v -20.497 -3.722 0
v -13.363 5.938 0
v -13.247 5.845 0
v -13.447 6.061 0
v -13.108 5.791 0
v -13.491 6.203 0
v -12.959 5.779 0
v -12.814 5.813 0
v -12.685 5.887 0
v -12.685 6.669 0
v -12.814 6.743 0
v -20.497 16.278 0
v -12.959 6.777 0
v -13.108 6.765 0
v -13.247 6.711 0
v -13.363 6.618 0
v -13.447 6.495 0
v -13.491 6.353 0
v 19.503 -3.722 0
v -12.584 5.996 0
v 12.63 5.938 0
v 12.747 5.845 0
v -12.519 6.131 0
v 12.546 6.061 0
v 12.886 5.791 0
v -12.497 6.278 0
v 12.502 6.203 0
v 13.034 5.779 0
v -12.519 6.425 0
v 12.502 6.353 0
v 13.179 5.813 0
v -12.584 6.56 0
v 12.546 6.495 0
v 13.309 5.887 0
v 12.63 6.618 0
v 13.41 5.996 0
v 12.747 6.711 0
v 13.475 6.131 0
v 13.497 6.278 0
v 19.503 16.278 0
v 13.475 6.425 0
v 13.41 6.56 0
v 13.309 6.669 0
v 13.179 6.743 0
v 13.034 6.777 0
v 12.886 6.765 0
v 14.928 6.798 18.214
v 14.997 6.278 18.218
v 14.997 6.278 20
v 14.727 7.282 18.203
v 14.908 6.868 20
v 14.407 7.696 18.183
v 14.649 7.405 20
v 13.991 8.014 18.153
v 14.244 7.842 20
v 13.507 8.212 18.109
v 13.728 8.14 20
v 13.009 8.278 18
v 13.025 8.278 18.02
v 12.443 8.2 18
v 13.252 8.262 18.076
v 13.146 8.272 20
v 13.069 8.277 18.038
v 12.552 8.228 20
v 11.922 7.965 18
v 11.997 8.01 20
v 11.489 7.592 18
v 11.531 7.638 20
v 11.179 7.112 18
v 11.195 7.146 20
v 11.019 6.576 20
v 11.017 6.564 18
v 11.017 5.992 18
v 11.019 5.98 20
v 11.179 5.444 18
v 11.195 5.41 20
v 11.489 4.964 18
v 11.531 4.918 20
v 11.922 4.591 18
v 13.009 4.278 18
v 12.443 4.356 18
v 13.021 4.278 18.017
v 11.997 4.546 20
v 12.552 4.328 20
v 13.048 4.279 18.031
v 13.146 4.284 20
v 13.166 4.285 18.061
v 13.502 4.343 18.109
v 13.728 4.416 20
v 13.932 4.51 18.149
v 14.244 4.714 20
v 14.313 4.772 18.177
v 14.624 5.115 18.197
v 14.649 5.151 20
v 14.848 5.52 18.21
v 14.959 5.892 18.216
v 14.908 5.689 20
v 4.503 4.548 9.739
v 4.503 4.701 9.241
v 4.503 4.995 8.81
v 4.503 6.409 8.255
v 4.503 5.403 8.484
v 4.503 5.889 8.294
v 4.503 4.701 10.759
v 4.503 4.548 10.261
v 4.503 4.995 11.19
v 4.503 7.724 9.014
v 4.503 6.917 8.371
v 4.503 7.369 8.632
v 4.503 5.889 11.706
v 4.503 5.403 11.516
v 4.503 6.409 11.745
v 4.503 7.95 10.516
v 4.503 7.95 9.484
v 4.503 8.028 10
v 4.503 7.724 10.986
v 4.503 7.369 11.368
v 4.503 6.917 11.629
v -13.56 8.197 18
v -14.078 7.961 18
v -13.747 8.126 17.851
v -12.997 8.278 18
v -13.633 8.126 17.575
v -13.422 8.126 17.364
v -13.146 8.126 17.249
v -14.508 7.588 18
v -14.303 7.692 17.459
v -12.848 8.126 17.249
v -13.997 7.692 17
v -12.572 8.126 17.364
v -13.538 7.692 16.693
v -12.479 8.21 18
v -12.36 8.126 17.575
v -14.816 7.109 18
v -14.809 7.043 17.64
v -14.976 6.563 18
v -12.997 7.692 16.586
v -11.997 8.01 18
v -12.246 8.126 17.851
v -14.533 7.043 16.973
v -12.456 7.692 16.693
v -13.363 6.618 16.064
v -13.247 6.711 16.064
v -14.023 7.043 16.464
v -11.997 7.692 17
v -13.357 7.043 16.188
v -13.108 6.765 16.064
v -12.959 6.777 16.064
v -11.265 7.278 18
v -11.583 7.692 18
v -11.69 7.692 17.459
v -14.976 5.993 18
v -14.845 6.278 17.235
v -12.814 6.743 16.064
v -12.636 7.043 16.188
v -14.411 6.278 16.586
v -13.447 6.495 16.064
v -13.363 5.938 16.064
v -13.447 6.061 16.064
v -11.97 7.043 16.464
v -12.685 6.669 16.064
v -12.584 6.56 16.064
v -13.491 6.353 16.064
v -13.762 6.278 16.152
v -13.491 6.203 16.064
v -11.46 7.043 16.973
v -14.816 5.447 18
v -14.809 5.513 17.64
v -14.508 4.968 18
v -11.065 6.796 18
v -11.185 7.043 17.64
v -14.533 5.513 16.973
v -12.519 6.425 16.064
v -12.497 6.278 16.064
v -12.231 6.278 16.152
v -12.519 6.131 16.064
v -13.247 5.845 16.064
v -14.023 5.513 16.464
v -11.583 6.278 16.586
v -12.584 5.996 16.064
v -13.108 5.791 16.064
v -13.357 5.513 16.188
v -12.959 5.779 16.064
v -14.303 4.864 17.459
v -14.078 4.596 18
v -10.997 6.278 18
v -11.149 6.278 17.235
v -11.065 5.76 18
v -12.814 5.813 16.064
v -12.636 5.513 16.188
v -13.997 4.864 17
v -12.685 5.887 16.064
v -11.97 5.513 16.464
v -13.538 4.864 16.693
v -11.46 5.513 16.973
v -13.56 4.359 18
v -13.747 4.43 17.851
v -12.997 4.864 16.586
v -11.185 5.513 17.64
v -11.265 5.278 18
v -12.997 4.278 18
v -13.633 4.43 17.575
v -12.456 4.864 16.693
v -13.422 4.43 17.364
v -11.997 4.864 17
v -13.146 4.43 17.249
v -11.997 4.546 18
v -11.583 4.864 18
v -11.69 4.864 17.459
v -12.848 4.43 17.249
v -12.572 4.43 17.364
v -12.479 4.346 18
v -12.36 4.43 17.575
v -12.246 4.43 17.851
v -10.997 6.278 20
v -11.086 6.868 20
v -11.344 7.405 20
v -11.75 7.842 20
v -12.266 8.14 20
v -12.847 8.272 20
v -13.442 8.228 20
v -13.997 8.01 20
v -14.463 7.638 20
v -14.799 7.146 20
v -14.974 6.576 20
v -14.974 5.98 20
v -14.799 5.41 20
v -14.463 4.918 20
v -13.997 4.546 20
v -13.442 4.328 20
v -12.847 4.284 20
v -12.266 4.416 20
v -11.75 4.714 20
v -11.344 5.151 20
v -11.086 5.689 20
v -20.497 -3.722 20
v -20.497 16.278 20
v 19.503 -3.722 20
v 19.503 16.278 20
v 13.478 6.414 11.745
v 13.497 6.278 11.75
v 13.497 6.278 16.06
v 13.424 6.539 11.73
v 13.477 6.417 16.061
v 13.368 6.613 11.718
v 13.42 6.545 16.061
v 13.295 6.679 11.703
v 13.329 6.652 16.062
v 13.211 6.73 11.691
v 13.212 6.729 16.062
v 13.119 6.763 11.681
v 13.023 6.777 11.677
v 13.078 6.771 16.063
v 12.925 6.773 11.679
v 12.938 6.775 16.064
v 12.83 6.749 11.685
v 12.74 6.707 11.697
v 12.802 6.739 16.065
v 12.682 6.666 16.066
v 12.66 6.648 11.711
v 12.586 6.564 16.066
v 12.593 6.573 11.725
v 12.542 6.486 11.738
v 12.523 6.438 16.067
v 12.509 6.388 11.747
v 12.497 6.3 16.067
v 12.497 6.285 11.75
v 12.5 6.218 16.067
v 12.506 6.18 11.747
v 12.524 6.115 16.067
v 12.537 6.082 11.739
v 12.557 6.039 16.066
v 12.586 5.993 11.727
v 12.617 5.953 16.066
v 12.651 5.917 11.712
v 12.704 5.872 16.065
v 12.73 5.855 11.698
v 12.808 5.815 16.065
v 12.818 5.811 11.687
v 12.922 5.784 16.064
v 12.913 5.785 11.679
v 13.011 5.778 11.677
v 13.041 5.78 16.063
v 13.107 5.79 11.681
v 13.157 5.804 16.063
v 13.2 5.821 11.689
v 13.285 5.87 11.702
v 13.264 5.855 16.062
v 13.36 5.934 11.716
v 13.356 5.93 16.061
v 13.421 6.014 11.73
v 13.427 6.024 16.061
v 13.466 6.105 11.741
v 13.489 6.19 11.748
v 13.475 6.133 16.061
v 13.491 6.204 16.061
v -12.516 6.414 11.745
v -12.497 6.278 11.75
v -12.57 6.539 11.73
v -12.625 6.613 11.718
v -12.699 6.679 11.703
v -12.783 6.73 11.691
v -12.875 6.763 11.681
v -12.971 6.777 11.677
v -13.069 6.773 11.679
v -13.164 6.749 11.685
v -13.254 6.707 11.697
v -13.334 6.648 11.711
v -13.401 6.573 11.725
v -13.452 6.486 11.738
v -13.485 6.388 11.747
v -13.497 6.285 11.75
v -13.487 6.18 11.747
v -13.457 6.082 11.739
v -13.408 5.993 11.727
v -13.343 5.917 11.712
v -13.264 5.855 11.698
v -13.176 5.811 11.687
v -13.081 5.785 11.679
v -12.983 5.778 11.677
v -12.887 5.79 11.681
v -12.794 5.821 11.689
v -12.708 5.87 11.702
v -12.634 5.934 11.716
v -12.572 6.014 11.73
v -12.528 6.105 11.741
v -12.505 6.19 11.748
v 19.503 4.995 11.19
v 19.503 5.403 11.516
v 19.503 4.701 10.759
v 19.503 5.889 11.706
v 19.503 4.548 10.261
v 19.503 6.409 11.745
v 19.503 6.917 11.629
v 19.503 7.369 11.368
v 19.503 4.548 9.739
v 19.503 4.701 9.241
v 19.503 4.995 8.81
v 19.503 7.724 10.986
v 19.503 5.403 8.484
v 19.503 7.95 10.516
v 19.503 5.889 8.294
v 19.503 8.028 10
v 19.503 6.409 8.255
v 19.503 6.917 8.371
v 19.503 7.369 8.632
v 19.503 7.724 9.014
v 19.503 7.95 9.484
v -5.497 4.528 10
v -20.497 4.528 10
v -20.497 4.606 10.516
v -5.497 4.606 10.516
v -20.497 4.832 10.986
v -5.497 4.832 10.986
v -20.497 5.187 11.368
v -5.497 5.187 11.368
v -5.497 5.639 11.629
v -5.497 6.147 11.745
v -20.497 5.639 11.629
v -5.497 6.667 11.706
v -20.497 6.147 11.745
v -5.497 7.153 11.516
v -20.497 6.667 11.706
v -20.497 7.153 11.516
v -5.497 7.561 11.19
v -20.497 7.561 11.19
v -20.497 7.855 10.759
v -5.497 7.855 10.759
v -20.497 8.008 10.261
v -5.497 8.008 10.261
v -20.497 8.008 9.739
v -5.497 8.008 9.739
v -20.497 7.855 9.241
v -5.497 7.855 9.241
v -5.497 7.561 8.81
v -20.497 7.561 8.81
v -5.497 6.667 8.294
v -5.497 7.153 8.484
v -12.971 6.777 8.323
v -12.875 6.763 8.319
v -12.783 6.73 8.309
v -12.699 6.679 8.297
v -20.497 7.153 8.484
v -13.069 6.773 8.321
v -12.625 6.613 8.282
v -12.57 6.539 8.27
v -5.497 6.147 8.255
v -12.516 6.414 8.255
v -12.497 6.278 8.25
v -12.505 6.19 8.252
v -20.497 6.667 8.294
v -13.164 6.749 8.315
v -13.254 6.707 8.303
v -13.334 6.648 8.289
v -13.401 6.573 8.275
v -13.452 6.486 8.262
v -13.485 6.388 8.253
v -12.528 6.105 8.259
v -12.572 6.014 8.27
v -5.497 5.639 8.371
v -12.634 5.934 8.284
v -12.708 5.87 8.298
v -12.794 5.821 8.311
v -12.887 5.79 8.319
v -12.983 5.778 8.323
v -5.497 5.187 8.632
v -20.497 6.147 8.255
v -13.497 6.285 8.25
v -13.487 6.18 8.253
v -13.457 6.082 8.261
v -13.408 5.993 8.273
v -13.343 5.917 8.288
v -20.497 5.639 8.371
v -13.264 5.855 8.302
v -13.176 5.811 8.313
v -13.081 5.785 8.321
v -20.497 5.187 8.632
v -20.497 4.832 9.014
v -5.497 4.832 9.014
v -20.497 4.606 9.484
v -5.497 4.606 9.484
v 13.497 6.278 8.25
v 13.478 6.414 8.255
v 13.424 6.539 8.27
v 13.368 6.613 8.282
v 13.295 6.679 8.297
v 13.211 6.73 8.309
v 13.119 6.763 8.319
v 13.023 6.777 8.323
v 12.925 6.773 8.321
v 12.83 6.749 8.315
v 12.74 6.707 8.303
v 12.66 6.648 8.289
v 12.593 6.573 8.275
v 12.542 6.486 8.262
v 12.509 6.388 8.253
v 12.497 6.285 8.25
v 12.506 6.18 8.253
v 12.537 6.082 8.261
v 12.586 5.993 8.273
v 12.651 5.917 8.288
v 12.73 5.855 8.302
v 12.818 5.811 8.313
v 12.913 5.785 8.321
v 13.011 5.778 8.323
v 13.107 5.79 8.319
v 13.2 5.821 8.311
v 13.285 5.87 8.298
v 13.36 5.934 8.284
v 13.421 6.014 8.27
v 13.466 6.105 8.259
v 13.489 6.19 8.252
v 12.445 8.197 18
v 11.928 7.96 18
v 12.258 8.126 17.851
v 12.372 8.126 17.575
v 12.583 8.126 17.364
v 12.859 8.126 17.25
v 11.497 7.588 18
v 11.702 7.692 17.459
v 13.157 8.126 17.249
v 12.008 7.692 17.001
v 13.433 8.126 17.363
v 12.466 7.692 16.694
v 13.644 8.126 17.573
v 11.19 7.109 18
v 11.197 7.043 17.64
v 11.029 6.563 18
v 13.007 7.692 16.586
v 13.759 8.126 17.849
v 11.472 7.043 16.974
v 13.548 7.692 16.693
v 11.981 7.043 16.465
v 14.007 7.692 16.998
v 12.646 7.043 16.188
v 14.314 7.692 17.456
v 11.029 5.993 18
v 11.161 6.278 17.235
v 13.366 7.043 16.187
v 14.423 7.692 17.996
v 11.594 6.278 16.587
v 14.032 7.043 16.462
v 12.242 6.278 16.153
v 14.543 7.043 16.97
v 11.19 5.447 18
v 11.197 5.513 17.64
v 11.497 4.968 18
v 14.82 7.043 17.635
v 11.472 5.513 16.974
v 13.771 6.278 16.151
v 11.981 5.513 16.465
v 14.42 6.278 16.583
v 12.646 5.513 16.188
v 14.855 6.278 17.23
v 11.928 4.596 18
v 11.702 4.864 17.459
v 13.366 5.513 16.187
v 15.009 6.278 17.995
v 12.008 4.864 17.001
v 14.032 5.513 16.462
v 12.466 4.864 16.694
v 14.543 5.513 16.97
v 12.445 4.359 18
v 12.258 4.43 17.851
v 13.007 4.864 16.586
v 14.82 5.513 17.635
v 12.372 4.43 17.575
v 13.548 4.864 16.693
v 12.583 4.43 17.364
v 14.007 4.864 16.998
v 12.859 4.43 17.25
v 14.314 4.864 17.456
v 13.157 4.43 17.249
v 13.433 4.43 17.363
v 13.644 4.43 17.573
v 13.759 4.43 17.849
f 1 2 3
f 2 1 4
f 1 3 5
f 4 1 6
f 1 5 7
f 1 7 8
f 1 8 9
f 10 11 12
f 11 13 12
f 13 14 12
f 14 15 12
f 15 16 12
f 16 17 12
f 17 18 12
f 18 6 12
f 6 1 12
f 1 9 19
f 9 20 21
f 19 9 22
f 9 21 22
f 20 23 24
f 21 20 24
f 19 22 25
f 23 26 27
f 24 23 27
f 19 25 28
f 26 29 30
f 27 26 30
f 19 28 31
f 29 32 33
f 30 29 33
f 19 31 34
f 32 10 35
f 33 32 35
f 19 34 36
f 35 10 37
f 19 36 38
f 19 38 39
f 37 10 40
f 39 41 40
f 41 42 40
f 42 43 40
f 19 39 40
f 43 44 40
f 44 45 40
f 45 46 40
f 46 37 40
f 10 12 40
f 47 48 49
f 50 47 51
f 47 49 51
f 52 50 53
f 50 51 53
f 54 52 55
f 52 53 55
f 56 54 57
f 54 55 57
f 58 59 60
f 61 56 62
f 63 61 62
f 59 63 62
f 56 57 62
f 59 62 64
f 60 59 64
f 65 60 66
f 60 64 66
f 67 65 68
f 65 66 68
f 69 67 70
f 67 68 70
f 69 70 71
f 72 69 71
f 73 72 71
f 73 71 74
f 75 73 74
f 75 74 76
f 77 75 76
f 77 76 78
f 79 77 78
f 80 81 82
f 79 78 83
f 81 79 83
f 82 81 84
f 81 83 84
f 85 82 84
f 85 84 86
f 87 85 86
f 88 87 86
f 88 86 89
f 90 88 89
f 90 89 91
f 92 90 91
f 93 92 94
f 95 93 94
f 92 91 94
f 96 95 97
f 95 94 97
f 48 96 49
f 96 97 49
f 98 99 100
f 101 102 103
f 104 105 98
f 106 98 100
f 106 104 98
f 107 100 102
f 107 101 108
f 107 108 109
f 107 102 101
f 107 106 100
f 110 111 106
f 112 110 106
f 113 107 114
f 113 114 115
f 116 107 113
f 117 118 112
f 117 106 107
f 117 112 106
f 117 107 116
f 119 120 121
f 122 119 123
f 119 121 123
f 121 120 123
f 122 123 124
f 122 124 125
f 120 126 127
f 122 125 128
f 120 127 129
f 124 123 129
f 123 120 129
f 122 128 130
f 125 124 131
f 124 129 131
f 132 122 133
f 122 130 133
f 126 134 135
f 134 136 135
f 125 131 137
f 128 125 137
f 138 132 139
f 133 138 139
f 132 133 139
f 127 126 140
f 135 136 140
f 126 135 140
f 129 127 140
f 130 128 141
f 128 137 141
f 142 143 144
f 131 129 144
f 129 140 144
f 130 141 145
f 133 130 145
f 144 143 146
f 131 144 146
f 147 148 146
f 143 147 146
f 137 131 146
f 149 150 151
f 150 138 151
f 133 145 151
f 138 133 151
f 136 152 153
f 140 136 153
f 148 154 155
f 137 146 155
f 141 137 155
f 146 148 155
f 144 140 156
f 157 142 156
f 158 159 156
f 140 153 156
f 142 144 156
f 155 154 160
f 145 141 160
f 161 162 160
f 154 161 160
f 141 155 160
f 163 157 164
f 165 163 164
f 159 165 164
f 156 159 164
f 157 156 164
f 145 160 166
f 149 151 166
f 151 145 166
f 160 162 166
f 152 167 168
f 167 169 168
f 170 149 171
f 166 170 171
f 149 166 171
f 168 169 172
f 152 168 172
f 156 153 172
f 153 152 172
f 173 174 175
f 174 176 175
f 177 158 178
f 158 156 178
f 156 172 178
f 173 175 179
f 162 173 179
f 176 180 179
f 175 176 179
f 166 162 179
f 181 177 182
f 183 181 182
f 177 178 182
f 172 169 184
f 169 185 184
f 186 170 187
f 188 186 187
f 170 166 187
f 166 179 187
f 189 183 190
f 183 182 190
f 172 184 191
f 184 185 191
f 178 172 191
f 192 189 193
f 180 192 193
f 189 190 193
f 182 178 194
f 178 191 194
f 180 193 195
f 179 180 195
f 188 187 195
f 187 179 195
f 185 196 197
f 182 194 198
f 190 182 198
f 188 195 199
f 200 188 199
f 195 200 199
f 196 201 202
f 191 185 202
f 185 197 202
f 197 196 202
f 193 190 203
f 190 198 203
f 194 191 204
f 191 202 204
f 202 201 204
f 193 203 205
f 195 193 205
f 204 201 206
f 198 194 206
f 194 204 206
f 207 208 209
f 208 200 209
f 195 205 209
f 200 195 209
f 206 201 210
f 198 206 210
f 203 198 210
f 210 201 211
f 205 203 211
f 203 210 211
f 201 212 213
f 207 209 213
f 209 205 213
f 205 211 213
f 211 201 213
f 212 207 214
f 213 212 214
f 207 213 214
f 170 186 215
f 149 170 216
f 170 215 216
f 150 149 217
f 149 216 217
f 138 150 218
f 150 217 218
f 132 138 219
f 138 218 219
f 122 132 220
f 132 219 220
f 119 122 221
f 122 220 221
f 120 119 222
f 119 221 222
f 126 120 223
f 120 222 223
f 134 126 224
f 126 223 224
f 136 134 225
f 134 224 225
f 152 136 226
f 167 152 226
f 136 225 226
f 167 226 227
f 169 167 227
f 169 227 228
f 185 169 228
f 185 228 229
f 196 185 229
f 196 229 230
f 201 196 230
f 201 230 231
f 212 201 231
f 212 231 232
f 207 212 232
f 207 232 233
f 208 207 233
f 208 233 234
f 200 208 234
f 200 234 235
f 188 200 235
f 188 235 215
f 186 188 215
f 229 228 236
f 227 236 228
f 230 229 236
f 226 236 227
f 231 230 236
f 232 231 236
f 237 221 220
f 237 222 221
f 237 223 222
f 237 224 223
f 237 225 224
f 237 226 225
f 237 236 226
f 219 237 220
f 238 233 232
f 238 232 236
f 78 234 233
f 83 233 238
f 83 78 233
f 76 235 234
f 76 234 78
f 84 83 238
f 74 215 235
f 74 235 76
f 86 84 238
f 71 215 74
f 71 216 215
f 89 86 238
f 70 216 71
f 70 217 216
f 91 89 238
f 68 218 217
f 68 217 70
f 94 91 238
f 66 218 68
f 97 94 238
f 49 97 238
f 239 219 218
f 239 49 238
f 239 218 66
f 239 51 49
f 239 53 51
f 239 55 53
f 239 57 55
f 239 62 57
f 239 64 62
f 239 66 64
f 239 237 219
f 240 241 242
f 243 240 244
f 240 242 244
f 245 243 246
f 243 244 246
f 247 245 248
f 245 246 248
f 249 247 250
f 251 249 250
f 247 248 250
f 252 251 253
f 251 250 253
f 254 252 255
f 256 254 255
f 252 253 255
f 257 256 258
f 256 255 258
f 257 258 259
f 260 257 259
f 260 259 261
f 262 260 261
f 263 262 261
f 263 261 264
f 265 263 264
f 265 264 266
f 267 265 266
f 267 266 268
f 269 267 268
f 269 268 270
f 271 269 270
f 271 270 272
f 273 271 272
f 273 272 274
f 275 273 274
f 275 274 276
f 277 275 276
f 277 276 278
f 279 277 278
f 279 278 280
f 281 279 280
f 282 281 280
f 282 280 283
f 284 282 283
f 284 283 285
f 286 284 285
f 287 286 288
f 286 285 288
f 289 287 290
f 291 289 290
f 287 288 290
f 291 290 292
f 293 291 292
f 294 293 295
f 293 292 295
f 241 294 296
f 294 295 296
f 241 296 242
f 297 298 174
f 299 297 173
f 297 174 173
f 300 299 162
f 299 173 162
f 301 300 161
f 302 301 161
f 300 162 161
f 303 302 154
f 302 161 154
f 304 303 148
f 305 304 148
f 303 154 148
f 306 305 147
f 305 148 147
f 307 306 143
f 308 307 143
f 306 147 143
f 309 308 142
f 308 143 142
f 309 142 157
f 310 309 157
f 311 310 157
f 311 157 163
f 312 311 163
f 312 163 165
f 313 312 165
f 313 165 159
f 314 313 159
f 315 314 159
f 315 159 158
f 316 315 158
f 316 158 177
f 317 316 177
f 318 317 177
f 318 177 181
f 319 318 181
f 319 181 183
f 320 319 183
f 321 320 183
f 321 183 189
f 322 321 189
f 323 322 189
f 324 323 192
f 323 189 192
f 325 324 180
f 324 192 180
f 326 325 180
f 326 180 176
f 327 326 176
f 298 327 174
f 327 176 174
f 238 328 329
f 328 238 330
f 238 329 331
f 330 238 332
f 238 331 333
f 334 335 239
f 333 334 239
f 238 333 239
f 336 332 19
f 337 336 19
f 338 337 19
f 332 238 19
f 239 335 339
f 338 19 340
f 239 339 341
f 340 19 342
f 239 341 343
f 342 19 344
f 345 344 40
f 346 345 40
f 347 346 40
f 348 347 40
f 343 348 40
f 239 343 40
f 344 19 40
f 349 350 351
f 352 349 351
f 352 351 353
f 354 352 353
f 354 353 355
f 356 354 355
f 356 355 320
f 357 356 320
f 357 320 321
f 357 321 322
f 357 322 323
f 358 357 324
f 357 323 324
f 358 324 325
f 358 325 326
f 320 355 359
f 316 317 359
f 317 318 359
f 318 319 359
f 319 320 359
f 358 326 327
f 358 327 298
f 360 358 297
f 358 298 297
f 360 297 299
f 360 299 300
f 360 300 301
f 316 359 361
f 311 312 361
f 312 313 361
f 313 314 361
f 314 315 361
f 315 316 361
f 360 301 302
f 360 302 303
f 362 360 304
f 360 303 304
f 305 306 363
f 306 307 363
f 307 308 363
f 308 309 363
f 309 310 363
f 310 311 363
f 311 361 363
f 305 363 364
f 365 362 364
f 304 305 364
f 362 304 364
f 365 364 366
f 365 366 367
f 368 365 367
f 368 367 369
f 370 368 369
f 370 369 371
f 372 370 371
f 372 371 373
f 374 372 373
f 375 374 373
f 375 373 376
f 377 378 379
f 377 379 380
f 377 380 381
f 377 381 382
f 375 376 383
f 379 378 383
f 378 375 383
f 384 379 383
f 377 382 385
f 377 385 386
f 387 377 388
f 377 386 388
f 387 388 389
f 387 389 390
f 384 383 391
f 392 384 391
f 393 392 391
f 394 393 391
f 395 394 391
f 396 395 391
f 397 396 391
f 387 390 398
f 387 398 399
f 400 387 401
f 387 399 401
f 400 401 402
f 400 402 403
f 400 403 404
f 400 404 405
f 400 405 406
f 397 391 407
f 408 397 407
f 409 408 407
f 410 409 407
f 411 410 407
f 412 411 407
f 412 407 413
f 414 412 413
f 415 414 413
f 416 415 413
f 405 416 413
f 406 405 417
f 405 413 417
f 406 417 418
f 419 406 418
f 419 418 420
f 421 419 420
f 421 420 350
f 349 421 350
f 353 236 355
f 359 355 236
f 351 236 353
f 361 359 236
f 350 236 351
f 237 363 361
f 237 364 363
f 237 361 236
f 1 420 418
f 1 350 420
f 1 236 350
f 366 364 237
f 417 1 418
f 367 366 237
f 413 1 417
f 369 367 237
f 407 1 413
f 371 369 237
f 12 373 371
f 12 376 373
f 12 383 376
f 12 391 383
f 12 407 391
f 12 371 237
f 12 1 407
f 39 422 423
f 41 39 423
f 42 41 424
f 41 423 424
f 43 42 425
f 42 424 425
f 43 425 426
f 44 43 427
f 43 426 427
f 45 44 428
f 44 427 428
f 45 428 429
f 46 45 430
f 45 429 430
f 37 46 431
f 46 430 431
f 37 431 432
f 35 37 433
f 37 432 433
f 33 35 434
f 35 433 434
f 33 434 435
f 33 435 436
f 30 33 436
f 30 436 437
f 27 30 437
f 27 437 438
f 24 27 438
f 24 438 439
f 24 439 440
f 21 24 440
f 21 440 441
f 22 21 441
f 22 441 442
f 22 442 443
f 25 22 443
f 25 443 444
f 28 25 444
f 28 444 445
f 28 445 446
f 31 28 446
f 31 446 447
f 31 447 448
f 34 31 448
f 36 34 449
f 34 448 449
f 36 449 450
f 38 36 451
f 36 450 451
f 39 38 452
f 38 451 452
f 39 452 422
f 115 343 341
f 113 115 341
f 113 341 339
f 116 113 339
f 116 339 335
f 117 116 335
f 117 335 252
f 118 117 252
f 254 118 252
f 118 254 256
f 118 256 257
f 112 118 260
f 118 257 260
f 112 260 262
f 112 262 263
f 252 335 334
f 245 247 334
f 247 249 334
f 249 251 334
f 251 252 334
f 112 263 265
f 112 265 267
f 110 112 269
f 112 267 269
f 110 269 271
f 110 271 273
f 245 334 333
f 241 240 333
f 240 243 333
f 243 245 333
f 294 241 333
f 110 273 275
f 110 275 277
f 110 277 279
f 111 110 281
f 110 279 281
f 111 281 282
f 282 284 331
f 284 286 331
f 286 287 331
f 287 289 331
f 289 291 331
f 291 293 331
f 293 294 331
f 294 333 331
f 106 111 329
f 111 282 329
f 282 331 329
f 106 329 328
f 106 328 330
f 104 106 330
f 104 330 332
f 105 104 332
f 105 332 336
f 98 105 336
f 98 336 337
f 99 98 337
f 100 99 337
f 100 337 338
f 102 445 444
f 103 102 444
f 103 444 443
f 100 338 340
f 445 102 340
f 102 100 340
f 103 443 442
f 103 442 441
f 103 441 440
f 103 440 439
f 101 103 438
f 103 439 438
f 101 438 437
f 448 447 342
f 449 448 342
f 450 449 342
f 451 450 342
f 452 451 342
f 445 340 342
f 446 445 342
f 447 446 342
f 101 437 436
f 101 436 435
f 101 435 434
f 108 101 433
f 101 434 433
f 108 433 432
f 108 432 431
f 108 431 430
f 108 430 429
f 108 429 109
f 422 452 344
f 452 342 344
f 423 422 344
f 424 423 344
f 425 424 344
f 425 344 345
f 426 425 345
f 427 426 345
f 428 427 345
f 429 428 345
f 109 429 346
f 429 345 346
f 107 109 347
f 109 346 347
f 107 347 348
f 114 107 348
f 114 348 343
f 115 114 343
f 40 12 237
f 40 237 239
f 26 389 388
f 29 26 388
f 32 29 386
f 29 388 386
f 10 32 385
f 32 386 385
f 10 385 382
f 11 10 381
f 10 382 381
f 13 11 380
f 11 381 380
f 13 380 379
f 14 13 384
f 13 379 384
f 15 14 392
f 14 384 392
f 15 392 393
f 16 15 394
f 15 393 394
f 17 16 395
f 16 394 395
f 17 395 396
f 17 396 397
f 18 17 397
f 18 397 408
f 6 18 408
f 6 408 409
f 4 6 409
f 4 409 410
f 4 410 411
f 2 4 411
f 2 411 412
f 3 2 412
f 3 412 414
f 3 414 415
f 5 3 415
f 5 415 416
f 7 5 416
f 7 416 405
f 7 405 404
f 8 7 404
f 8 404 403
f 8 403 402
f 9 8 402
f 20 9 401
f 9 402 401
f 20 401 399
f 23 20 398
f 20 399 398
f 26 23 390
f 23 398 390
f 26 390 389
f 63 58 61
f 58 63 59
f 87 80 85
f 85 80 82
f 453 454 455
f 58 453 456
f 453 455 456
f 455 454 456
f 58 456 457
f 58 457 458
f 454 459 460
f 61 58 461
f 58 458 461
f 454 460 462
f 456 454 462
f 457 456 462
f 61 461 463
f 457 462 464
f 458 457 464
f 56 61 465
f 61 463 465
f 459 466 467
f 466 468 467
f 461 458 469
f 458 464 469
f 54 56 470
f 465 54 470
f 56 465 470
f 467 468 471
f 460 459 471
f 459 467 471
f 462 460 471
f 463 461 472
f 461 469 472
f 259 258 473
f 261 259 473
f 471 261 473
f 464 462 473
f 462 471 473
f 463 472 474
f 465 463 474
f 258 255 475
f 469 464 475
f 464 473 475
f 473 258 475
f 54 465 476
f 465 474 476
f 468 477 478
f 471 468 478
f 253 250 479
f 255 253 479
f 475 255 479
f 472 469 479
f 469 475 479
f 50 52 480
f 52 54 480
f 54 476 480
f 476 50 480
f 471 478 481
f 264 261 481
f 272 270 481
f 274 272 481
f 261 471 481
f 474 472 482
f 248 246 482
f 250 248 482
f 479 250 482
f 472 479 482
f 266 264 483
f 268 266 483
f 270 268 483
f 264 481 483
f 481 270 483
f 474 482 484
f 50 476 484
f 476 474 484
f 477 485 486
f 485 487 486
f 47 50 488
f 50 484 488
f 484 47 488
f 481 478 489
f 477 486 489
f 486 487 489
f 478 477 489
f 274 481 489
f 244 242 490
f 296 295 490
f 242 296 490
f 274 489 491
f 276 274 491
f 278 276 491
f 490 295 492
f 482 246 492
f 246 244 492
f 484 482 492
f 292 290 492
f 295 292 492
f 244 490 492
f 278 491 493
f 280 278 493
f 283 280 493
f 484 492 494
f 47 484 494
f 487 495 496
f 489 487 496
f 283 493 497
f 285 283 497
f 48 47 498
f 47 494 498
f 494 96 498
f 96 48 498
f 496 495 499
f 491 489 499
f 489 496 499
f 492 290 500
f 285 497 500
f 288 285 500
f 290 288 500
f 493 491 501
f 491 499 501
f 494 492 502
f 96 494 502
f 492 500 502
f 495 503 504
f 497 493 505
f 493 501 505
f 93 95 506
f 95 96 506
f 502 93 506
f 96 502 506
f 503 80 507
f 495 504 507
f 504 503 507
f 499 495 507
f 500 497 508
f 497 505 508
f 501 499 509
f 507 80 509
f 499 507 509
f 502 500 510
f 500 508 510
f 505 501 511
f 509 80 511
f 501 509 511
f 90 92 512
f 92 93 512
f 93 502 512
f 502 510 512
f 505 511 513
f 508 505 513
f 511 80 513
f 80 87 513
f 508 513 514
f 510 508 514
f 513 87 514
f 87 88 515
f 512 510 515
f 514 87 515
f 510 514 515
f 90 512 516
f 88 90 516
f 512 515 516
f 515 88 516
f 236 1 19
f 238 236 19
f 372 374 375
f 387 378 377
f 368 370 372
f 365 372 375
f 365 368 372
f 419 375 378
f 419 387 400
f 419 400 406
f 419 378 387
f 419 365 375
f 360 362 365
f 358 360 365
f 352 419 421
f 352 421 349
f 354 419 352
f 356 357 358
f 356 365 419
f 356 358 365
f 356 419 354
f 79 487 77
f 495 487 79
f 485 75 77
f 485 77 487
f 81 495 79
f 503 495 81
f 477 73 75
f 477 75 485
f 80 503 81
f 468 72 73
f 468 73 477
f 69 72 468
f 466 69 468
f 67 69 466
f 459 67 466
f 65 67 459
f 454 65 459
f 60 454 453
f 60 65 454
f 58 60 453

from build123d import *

# Parameters (mm, degrees)
F0_W      = 40
F0_H      = 20
F1_DEPTH  = 20
F2_R      = 1.75
F3_DEPTH  = 15
F4_R      = 1.75
F5_DEPTH  = 15
F6_R      = 0.5
F7_DEPTH  = 20.001
F8_R      = 2
F9_DEPTH  = 2
F12_R     = 2
F13_DEPTH = 2


with BuildPart() as f1:
    # F0 (on Top) → F1 (new body)
    with BuildSketch(Plane.XY):
        with Locations((-0.4968201369, 6.2780210599)):
            Rectangle(F0_W, F0_H)
    extrude(amount=F1_DEPTH)

    # F2 (on face) → F3 (cut)
    with BuildSketch(Plane(origin=(-20.4968201369, 0, 0), x_dir=(0, -1, 0), z_dir=(-1, 0, 0))):
        with Locations((-6.2780210599, 10)):
            Circle(F2_R)
    extrude(amount=-F3_DEPTH, mode=Mode.SUBTRACT)

    # F4 (on face) → F5 (cut)
    with BuildSketch(Plane.YZ.offset(19.5031798631)):
        with Locations((6.2780210599, 10)):
            Circle(F4_R)
    extrude(amount=-F5_DEPTH, mode=Mode.SUBTRACT)

    # F6 (on face) → F7 (cut, through all)
    with BuildSketch(Plane.XY.offset(20)):
        with Locations((-12.9968201369, 6.2780210599)):
            Circle(F6_R)
        with Locations((12.9968201369, 6.2780210599)):
            Circle(F6_R)
    extrude(amount=-F7_DEPTH, mode=Mode.SUBTRACT)

    # F8 (on face) → F9 (cut)
    with BuildSketch(Plane.XY.offset(20)):
        with Locations((-12.9968201369, 6.2780210599)):
            Circle(F8_R)
    extrude(amount=-F9_DEPTH, mode=Mode.SUBTRACT)

    # F10 (on face) → F11 (revolve, cut)
    with BuildSketch(Plane.XY.offset(18)):
        with BuildLine():
            Line((-12.9968201369, 4.2780210599), (-12.9968201369, 8.2780210599))
            ThreePointArc((-12.9968201369, 8.2780210599), (-14.9968201369, 6.2780210599), (-12.9968201369, 4.2780210599))
        make_face()
    revolve(axis=Axis((-12.9968201369, 6.2780210599, 18), (0, -1, 0)), mode=Mode.SUBTRACT)

    # F12 (on face) → F13 (cut)
    with BuildSketch(Plane.XY.offset(20)):
        with Locations((12.9968201369, 6.2780210599)):
            Circle(F12_R)
    extrude(amount=-F13_DEPTH, mode=Mode.SUBTRACT)

    # F14 (on face) → F15 (revolve, cut)
    with BuildSketch(Plane.XY.offset(18)):
        with BuildLine():
            Line((13.0087840564, 4.278056844), (13.0087840564, 8.2779852757))
            ThreePointArc((13.0087840564, 8.2779852757), (11.0088198406, 6.2780210599), (13.0087840564, 4.278056844))
        make_face()
    revolve(axis=Axis((13.0087840564, 6.2780210599, 18), (0, -1, 0)), mode=Mode.SUBTRACT)


solid = f1.part
